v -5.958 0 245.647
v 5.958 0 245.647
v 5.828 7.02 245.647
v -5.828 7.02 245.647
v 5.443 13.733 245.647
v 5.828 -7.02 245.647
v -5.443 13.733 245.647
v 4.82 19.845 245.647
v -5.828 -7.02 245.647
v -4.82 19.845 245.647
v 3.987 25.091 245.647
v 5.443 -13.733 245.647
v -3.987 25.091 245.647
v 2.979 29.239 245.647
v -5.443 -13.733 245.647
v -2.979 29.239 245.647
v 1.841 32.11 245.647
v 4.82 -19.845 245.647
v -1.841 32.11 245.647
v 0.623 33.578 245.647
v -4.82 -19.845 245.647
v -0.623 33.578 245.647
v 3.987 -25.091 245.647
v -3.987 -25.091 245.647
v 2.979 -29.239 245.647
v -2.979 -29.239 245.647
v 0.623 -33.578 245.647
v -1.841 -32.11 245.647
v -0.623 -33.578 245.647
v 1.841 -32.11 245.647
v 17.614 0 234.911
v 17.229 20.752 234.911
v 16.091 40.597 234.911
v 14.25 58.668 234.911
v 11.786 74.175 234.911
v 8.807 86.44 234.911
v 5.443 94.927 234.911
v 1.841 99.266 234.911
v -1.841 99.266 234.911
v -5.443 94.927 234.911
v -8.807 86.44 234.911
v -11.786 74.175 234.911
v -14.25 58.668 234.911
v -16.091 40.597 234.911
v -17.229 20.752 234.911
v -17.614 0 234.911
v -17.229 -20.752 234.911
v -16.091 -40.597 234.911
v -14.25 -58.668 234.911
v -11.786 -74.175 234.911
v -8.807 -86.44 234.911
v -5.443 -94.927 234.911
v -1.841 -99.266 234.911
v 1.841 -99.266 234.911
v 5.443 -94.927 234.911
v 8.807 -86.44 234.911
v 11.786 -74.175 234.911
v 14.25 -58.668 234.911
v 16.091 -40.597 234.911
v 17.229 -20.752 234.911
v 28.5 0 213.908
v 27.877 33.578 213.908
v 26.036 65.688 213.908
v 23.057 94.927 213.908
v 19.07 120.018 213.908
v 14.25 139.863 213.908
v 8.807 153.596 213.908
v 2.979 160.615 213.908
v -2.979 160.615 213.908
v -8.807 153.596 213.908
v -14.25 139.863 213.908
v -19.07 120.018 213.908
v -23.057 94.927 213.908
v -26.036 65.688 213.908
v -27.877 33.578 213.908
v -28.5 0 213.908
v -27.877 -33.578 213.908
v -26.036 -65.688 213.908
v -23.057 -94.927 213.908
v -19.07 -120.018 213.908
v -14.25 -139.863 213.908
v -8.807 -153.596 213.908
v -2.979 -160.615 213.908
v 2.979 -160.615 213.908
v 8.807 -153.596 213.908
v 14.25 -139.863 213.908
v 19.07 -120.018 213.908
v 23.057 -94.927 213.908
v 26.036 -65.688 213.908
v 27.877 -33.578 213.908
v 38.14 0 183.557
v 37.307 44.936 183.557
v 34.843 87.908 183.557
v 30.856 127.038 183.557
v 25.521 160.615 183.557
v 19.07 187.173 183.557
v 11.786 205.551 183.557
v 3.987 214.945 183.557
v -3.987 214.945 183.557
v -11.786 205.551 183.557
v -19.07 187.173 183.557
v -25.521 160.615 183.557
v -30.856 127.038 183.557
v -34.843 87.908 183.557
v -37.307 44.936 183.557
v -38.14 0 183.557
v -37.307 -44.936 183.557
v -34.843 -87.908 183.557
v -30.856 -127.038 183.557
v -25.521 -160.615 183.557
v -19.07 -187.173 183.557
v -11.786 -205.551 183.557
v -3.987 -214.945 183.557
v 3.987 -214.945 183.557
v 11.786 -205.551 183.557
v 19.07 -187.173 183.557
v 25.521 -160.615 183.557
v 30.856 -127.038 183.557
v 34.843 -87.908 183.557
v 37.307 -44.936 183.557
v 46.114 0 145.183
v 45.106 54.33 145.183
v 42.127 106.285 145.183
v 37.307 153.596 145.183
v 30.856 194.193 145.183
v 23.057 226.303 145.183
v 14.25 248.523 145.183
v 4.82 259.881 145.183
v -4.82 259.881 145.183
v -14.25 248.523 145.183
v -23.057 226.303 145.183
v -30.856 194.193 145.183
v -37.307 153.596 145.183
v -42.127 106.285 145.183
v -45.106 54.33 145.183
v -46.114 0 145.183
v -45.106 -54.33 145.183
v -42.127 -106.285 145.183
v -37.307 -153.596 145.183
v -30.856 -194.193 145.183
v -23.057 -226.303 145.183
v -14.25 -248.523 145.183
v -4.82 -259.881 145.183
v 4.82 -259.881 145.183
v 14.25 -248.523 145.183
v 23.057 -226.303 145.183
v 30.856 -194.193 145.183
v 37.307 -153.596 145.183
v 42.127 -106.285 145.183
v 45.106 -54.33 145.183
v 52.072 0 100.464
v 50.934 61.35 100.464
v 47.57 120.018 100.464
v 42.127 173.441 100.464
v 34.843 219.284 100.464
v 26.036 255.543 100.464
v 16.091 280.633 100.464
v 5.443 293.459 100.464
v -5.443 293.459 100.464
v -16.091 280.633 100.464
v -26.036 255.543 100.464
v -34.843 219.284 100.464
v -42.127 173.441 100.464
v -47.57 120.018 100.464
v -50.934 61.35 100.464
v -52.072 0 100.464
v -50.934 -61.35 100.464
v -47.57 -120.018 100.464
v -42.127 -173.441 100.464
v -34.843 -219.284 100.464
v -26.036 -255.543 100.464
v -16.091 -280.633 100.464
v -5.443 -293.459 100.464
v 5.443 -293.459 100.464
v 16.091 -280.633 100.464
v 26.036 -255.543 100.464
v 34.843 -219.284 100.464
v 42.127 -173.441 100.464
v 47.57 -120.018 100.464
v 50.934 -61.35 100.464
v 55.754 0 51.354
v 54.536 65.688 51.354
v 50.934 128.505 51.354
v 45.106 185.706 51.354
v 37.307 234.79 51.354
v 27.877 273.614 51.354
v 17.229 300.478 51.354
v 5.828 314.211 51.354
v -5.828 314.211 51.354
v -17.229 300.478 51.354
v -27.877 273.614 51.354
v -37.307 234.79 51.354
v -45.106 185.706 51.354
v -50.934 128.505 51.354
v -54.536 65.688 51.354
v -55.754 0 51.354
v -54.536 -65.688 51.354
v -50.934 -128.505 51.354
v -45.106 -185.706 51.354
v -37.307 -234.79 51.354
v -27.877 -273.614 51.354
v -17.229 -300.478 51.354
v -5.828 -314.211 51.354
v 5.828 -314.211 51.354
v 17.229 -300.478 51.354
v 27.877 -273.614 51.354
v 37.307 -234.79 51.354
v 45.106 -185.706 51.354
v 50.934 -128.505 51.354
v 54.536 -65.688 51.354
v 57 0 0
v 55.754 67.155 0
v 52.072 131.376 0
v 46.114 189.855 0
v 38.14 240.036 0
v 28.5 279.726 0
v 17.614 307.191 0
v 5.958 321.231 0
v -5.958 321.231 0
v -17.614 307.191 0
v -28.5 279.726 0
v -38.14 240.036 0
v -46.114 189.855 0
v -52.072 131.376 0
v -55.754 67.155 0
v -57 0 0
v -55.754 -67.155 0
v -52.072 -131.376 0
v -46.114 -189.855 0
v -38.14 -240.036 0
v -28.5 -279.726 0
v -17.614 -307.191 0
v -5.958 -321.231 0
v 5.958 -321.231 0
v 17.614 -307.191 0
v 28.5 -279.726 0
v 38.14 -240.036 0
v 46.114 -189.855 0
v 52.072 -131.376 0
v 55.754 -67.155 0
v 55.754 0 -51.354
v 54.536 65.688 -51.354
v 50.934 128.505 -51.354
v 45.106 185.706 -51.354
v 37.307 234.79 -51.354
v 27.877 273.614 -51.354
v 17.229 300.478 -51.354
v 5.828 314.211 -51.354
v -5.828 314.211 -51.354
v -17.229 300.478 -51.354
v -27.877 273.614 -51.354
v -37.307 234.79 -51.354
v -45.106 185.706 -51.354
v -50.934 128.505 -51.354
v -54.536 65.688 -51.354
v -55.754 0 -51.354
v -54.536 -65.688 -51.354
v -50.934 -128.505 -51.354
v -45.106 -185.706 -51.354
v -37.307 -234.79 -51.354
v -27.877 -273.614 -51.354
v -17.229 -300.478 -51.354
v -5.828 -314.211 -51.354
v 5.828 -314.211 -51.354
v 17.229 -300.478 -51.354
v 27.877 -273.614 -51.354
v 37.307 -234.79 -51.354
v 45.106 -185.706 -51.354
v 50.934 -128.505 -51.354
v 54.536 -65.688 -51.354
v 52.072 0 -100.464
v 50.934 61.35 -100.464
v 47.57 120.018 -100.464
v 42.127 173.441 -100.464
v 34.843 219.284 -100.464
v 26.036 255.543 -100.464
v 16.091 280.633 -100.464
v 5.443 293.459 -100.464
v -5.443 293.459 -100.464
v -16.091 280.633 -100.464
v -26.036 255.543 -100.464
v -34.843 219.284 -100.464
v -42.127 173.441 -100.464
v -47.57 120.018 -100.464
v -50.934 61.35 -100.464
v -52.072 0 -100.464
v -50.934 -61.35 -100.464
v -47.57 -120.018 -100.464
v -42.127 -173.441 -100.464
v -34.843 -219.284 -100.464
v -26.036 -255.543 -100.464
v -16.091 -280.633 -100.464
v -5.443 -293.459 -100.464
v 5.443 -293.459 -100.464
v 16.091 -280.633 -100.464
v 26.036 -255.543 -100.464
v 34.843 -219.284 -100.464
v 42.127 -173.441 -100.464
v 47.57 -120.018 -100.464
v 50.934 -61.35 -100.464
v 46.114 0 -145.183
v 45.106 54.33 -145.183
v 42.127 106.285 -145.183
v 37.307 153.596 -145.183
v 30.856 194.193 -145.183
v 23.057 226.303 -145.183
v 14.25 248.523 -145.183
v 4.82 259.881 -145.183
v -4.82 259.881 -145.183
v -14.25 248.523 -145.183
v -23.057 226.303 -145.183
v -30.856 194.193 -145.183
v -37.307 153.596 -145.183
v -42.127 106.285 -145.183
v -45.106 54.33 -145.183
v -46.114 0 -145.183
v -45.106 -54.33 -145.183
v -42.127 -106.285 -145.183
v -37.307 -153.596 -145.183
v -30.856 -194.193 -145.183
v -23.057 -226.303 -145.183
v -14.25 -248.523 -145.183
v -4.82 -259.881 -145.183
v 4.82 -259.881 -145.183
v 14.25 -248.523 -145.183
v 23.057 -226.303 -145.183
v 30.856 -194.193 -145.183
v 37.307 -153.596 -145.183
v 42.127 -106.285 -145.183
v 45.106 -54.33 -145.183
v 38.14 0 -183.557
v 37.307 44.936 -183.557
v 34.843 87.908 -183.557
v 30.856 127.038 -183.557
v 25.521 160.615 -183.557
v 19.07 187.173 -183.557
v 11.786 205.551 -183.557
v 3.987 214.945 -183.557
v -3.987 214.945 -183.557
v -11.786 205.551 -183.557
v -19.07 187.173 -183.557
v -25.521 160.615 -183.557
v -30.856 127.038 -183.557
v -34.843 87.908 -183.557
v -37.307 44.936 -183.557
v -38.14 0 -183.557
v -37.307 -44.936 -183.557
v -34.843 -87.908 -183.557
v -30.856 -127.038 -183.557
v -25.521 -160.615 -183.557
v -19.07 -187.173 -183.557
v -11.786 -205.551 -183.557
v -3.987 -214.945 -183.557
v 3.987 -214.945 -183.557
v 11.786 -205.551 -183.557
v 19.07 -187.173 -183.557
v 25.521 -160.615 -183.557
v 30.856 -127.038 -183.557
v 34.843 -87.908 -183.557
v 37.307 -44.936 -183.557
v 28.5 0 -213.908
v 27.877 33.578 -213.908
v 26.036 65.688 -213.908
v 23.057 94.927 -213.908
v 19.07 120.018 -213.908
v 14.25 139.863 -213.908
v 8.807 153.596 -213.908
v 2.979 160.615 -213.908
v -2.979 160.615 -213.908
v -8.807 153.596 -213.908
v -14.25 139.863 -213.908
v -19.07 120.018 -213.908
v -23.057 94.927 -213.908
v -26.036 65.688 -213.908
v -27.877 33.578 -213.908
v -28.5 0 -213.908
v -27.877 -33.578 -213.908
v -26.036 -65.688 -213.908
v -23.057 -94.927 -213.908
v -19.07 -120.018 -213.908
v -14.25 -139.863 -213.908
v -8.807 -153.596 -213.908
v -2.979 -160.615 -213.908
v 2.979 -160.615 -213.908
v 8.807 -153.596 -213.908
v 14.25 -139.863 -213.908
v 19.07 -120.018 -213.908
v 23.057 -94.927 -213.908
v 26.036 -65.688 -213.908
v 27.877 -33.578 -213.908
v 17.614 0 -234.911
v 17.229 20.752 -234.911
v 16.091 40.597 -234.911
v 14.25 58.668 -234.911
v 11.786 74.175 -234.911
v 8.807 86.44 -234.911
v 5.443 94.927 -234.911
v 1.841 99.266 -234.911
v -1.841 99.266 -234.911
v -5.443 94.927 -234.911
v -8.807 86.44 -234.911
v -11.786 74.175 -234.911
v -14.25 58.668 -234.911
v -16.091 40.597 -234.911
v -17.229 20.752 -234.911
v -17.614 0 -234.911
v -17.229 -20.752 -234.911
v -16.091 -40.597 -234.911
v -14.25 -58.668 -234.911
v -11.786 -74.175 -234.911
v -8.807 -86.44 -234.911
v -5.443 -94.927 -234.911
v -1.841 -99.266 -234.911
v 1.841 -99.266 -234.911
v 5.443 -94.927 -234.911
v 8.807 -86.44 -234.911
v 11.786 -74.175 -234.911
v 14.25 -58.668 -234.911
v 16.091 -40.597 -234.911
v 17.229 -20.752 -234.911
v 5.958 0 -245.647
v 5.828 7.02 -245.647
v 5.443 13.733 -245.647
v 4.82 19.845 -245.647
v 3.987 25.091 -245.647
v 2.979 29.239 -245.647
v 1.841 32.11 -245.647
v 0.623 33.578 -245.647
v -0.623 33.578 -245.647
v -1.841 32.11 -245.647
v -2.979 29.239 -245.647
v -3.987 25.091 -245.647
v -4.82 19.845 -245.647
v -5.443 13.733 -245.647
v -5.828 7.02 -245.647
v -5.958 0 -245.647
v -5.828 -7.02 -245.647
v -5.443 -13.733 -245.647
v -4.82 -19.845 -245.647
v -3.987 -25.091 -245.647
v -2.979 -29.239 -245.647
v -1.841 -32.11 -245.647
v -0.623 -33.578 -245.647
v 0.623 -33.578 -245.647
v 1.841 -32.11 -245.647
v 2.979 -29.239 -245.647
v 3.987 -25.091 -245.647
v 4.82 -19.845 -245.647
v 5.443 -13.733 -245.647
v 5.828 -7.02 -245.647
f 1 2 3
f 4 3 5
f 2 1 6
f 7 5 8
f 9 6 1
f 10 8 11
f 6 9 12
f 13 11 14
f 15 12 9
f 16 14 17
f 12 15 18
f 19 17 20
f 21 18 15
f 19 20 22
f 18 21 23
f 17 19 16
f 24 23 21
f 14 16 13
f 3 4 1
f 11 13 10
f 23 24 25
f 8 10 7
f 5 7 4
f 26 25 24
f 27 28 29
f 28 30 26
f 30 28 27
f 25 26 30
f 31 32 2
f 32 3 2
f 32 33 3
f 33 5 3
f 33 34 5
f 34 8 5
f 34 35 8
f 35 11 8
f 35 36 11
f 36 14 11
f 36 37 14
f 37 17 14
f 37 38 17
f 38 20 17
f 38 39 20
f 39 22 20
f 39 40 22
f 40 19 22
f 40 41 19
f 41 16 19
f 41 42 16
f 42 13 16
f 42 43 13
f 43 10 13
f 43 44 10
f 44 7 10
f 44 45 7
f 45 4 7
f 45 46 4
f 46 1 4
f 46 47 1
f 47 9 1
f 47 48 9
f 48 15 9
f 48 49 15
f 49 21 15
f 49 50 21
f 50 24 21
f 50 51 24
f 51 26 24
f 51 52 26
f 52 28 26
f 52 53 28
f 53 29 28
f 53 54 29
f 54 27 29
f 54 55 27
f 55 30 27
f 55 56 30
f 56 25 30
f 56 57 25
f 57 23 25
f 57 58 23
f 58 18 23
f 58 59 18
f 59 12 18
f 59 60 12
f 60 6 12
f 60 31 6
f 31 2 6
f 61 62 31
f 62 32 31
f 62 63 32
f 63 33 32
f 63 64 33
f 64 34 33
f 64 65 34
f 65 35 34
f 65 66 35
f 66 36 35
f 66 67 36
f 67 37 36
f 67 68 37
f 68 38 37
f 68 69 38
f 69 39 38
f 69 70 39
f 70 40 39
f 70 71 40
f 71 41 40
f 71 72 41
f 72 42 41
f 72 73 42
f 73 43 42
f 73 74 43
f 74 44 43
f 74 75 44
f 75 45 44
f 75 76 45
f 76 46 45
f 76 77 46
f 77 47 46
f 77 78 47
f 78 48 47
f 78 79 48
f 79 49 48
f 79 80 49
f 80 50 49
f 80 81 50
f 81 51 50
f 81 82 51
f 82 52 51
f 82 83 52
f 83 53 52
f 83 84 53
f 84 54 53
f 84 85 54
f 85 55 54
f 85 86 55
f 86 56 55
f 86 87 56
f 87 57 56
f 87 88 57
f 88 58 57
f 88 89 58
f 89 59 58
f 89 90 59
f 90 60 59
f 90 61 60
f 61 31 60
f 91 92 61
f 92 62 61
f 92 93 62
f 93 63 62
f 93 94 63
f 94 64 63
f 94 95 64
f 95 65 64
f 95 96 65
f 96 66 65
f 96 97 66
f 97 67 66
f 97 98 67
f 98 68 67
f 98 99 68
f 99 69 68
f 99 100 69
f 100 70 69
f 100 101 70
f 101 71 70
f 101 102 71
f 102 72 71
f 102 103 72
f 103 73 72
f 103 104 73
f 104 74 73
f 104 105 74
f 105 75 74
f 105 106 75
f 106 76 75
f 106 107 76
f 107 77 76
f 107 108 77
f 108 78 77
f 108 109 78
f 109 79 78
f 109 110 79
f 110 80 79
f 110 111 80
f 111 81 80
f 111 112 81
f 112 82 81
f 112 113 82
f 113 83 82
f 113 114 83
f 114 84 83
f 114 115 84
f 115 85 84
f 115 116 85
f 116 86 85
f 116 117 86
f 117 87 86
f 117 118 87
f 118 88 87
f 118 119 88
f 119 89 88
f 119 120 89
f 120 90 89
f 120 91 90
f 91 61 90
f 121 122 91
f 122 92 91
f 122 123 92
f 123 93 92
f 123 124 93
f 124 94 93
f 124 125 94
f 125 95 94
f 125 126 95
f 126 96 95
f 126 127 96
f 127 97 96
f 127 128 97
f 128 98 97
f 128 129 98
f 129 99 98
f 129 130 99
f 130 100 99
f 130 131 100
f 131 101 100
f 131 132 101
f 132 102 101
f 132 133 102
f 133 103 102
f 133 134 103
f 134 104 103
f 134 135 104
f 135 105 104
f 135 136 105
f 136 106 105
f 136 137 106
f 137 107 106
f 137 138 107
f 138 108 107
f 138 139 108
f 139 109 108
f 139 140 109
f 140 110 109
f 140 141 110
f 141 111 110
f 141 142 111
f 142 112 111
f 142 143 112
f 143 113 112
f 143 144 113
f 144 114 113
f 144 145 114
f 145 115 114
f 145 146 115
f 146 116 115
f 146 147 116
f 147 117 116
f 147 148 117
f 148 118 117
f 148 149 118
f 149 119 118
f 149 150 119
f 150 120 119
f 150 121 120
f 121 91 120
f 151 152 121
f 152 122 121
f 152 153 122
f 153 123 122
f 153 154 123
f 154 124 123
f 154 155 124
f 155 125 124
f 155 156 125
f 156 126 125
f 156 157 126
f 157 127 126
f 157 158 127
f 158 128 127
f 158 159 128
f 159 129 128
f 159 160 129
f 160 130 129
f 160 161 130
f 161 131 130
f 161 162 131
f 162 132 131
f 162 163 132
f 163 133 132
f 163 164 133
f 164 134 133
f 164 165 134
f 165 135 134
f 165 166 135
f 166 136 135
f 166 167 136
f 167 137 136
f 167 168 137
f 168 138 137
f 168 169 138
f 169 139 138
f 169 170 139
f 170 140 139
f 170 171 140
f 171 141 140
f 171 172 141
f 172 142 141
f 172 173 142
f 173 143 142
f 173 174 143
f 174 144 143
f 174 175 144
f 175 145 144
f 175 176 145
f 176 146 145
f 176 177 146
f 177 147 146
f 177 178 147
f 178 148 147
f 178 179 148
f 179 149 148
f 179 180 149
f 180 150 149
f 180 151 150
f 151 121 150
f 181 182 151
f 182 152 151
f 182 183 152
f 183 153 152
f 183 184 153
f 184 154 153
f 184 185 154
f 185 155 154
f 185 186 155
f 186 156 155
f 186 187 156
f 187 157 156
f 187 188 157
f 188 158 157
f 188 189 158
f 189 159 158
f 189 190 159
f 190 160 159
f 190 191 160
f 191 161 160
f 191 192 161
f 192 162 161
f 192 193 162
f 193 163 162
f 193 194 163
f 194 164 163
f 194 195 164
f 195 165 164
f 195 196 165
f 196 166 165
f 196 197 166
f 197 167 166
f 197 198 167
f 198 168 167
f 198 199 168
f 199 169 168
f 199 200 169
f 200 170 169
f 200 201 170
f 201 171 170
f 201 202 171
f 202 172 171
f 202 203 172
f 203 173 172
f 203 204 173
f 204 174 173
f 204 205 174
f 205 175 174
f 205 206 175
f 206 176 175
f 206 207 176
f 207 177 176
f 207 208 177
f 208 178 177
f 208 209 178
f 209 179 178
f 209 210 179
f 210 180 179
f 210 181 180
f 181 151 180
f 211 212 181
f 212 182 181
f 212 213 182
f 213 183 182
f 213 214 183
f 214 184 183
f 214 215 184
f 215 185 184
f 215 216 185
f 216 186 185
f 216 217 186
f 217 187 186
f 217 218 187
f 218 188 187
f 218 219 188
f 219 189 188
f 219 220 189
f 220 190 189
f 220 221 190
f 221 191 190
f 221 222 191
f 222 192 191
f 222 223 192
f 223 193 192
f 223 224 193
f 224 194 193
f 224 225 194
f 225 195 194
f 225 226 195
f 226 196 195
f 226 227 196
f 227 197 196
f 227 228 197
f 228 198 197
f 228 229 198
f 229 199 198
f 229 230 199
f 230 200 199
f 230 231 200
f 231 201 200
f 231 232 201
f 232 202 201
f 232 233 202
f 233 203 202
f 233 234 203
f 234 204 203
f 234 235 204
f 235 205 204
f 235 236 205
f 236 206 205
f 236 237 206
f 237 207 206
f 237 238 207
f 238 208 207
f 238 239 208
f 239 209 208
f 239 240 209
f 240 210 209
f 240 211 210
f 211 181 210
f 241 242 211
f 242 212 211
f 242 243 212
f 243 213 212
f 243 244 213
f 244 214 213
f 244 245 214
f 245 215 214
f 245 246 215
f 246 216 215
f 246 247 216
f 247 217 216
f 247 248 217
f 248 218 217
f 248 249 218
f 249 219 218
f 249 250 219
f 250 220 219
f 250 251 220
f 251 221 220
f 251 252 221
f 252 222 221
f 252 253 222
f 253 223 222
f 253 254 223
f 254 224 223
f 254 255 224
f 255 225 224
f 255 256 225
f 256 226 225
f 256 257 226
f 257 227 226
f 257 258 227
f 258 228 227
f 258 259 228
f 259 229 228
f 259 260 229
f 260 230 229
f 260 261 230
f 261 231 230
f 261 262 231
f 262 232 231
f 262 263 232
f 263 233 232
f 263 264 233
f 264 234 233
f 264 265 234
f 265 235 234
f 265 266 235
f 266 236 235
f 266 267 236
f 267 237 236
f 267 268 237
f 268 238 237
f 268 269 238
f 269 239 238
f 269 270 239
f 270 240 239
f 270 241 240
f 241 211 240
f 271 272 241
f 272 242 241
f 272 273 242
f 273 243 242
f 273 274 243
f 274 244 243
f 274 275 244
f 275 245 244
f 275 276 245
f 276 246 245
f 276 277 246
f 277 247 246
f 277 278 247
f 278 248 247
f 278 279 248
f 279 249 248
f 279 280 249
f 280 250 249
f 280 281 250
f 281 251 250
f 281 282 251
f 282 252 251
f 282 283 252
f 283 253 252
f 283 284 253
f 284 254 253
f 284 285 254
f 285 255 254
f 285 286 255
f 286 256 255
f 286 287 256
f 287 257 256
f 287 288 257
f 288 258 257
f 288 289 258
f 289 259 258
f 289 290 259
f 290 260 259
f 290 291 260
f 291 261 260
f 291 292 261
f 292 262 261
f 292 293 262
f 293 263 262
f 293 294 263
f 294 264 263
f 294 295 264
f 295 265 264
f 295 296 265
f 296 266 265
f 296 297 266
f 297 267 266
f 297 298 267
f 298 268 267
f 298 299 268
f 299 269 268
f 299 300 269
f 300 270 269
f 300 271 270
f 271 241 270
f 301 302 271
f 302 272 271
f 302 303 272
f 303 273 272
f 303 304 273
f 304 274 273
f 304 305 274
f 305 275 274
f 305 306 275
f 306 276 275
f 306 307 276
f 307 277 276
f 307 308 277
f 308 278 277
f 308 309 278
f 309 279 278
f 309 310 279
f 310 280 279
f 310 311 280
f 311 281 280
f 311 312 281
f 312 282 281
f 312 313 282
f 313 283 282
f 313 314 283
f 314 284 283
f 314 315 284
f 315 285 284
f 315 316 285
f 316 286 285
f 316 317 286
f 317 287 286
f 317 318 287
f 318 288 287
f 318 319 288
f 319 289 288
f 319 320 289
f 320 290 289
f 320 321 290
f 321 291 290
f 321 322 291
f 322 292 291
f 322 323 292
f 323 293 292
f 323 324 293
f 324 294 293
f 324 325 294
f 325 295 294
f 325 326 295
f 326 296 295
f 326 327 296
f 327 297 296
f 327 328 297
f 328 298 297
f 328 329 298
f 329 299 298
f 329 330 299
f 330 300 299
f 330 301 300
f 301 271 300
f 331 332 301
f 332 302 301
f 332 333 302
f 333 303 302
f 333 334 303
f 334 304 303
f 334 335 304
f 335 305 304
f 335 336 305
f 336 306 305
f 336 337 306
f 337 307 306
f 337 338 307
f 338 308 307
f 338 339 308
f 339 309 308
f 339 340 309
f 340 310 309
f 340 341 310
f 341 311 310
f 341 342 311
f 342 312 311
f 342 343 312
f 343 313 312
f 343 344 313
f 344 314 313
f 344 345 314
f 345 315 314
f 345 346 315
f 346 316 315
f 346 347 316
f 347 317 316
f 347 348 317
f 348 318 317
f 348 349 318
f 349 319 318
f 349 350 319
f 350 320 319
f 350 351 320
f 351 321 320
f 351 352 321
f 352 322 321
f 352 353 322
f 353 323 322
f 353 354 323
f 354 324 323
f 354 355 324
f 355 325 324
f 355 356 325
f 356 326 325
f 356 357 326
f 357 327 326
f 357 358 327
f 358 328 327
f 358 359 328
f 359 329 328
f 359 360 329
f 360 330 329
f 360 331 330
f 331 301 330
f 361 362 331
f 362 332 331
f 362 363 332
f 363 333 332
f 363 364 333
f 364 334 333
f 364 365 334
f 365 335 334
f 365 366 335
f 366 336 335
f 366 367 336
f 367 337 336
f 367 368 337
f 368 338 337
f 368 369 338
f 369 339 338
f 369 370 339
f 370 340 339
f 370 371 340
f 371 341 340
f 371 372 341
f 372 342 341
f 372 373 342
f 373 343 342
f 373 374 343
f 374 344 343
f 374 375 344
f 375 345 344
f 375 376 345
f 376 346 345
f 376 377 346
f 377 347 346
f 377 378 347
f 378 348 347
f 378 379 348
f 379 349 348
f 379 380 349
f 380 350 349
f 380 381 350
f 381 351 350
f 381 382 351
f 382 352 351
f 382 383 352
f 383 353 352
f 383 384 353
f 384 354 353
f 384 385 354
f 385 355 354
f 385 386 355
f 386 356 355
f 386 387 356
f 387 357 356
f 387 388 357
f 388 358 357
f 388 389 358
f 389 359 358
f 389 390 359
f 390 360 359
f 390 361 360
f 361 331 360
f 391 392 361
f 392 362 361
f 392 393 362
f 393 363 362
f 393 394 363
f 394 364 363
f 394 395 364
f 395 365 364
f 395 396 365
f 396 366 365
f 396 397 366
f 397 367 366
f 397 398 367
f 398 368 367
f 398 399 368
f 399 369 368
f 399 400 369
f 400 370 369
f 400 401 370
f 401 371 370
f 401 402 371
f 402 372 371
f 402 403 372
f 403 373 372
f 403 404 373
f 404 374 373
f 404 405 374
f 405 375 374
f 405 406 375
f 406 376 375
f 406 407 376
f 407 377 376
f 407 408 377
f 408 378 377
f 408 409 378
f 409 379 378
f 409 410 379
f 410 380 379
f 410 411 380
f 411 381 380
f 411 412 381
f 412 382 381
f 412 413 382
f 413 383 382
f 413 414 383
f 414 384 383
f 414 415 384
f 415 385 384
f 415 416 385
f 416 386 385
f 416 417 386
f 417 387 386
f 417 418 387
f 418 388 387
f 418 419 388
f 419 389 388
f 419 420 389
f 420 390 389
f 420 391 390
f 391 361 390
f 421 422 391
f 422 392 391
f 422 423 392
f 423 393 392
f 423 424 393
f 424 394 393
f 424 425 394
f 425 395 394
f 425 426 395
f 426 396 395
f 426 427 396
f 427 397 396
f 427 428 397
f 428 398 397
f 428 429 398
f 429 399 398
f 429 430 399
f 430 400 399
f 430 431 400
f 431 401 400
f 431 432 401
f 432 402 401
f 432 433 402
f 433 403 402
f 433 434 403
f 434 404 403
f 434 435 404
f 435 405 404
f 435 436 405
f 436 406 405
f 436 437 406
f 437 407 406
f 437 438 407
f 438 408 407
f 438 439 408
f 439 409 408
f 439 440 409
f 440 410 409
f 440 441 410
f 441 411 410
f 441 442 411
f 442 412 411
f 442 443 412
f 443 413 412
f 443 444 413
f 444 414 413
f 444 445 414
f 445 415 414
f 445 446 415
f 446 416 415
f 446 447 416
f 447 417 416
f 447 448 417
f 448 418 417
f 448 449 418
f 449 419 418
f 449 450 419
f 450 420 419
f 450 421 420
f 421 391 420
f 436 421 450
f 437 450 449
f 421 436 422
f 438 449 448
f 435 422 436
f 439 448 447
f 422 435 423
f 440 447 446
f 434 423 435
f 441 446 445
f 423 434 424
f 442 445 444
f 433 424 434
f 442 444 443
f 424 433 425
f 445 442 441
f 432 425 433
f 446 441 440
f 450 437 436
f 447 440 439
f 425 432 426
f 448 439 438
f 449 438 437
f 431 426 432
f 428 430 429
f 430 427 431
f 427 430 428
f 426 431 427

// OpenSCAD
// Generated by SolidPython 1.0.1 on 2020-07-29 00:46:46


scale(v = [3, 17, 13]) {
	sphere(r = 19);
}
/***********************************************
*********      SolidPython code:      **********
************************************************
 
# import packages: SolidPython
from solid import *
from solid.utils import *
from itertools import chain, combinations, permutations


class Resize:

    def __init__(self, scad_file):
        self.scad_file = scad_file
        #self.scad_file = import_scad(scad_file)
        # cone/cylinder param:
        self.r1 = 0
        self.r2 = 0
        self.h = 0
        # rectangular prism param:
        self.w = 0
        self.l = 0
        # ellipse param:
        self.r = 0

    # import OpenScad code (file name corresponds to shape)


    # classify shape + parameters
    def assign(self, param1, param2, param3):
        if self.scad_file == 'cone.scad':
            self.r1 = param1
            self.r2 = param2
            self.h = param3
        elif self.scad_file == 'cylinder.scad':
            self.r1 = param1
            self.r2 = param2
            self.h = param3
        elif self.scad_file == 'rectangularPrism.scad':
            self.h = param1
            self.l = param2
            self.w = param3
        else:
            self.r = param1
            self.h = param2

    # resize parameters
    def iterate(self):
        x = range(3, 20, 2)
        i = 1
        if self.scad_file == 'cone.scad':
            tempList = list(permutations(x, 2))
            for temp in tempList:
                param1 = temp[0]
                param2 = temp[1]
                filepath = 'produced_scad_files/' + 'cone' + str(param1) + '_' + str(param2) + '_' + '.scad'
                scad_render_to_file(cylinder(h=param1, r1=param2, r2=0), filepath)

        elif self.scad_file == 'cylinder.scad':
            tempList = list(permutations(x, 3))
            for temp in tempList:
                param1 = temp[0]
                param2 = temp[1]
                filepath = 'produced_scad_files/' + 'cylinder' + str(param1) + '_' + str(param2) + '_' + '.scad'
                scad_render_to_file(cylinder(h=param1, r1=param2, r2=param2), filepath)

        elif self.scad_file == 'rectangularPrism.scad':
            tempList = list(permutations(x, 3))
            for temp in tempList:
                param1 = temp[0]
                param2 = temp[1]
                param3 = temp[2]
                filepath = 'produced_scad_files/' + 'rectangularPrism' + str(param1) + '_' + str(param2) + '_' + str(
                    param3) + '.scad'
                scad_render_to_file(cube(size=(param1, param2, param3)), filepath)

        elif self.scad_file == 'ellipse.scad':
            tempList = list(permutations(x, 4))
            for temp in tempList:
                param1 = temp[0]
                param2 = temp[1]
                param3 = temp[2]
                param4 = temp[3]
                filepath = 'produced_scad_files/' + 'ellipse' + str(param1) + '_' + str(param2) + '_' + str(param3) + '_' + str(param4) + '.scad'
                scad_render_to_file(scale([param1, param2, param3])(sphere(r=param4)), filepath)

    def render_to_scadfile(self):
        scad_render_to_file(scad, 'example.scad') 
 
************************************************/
